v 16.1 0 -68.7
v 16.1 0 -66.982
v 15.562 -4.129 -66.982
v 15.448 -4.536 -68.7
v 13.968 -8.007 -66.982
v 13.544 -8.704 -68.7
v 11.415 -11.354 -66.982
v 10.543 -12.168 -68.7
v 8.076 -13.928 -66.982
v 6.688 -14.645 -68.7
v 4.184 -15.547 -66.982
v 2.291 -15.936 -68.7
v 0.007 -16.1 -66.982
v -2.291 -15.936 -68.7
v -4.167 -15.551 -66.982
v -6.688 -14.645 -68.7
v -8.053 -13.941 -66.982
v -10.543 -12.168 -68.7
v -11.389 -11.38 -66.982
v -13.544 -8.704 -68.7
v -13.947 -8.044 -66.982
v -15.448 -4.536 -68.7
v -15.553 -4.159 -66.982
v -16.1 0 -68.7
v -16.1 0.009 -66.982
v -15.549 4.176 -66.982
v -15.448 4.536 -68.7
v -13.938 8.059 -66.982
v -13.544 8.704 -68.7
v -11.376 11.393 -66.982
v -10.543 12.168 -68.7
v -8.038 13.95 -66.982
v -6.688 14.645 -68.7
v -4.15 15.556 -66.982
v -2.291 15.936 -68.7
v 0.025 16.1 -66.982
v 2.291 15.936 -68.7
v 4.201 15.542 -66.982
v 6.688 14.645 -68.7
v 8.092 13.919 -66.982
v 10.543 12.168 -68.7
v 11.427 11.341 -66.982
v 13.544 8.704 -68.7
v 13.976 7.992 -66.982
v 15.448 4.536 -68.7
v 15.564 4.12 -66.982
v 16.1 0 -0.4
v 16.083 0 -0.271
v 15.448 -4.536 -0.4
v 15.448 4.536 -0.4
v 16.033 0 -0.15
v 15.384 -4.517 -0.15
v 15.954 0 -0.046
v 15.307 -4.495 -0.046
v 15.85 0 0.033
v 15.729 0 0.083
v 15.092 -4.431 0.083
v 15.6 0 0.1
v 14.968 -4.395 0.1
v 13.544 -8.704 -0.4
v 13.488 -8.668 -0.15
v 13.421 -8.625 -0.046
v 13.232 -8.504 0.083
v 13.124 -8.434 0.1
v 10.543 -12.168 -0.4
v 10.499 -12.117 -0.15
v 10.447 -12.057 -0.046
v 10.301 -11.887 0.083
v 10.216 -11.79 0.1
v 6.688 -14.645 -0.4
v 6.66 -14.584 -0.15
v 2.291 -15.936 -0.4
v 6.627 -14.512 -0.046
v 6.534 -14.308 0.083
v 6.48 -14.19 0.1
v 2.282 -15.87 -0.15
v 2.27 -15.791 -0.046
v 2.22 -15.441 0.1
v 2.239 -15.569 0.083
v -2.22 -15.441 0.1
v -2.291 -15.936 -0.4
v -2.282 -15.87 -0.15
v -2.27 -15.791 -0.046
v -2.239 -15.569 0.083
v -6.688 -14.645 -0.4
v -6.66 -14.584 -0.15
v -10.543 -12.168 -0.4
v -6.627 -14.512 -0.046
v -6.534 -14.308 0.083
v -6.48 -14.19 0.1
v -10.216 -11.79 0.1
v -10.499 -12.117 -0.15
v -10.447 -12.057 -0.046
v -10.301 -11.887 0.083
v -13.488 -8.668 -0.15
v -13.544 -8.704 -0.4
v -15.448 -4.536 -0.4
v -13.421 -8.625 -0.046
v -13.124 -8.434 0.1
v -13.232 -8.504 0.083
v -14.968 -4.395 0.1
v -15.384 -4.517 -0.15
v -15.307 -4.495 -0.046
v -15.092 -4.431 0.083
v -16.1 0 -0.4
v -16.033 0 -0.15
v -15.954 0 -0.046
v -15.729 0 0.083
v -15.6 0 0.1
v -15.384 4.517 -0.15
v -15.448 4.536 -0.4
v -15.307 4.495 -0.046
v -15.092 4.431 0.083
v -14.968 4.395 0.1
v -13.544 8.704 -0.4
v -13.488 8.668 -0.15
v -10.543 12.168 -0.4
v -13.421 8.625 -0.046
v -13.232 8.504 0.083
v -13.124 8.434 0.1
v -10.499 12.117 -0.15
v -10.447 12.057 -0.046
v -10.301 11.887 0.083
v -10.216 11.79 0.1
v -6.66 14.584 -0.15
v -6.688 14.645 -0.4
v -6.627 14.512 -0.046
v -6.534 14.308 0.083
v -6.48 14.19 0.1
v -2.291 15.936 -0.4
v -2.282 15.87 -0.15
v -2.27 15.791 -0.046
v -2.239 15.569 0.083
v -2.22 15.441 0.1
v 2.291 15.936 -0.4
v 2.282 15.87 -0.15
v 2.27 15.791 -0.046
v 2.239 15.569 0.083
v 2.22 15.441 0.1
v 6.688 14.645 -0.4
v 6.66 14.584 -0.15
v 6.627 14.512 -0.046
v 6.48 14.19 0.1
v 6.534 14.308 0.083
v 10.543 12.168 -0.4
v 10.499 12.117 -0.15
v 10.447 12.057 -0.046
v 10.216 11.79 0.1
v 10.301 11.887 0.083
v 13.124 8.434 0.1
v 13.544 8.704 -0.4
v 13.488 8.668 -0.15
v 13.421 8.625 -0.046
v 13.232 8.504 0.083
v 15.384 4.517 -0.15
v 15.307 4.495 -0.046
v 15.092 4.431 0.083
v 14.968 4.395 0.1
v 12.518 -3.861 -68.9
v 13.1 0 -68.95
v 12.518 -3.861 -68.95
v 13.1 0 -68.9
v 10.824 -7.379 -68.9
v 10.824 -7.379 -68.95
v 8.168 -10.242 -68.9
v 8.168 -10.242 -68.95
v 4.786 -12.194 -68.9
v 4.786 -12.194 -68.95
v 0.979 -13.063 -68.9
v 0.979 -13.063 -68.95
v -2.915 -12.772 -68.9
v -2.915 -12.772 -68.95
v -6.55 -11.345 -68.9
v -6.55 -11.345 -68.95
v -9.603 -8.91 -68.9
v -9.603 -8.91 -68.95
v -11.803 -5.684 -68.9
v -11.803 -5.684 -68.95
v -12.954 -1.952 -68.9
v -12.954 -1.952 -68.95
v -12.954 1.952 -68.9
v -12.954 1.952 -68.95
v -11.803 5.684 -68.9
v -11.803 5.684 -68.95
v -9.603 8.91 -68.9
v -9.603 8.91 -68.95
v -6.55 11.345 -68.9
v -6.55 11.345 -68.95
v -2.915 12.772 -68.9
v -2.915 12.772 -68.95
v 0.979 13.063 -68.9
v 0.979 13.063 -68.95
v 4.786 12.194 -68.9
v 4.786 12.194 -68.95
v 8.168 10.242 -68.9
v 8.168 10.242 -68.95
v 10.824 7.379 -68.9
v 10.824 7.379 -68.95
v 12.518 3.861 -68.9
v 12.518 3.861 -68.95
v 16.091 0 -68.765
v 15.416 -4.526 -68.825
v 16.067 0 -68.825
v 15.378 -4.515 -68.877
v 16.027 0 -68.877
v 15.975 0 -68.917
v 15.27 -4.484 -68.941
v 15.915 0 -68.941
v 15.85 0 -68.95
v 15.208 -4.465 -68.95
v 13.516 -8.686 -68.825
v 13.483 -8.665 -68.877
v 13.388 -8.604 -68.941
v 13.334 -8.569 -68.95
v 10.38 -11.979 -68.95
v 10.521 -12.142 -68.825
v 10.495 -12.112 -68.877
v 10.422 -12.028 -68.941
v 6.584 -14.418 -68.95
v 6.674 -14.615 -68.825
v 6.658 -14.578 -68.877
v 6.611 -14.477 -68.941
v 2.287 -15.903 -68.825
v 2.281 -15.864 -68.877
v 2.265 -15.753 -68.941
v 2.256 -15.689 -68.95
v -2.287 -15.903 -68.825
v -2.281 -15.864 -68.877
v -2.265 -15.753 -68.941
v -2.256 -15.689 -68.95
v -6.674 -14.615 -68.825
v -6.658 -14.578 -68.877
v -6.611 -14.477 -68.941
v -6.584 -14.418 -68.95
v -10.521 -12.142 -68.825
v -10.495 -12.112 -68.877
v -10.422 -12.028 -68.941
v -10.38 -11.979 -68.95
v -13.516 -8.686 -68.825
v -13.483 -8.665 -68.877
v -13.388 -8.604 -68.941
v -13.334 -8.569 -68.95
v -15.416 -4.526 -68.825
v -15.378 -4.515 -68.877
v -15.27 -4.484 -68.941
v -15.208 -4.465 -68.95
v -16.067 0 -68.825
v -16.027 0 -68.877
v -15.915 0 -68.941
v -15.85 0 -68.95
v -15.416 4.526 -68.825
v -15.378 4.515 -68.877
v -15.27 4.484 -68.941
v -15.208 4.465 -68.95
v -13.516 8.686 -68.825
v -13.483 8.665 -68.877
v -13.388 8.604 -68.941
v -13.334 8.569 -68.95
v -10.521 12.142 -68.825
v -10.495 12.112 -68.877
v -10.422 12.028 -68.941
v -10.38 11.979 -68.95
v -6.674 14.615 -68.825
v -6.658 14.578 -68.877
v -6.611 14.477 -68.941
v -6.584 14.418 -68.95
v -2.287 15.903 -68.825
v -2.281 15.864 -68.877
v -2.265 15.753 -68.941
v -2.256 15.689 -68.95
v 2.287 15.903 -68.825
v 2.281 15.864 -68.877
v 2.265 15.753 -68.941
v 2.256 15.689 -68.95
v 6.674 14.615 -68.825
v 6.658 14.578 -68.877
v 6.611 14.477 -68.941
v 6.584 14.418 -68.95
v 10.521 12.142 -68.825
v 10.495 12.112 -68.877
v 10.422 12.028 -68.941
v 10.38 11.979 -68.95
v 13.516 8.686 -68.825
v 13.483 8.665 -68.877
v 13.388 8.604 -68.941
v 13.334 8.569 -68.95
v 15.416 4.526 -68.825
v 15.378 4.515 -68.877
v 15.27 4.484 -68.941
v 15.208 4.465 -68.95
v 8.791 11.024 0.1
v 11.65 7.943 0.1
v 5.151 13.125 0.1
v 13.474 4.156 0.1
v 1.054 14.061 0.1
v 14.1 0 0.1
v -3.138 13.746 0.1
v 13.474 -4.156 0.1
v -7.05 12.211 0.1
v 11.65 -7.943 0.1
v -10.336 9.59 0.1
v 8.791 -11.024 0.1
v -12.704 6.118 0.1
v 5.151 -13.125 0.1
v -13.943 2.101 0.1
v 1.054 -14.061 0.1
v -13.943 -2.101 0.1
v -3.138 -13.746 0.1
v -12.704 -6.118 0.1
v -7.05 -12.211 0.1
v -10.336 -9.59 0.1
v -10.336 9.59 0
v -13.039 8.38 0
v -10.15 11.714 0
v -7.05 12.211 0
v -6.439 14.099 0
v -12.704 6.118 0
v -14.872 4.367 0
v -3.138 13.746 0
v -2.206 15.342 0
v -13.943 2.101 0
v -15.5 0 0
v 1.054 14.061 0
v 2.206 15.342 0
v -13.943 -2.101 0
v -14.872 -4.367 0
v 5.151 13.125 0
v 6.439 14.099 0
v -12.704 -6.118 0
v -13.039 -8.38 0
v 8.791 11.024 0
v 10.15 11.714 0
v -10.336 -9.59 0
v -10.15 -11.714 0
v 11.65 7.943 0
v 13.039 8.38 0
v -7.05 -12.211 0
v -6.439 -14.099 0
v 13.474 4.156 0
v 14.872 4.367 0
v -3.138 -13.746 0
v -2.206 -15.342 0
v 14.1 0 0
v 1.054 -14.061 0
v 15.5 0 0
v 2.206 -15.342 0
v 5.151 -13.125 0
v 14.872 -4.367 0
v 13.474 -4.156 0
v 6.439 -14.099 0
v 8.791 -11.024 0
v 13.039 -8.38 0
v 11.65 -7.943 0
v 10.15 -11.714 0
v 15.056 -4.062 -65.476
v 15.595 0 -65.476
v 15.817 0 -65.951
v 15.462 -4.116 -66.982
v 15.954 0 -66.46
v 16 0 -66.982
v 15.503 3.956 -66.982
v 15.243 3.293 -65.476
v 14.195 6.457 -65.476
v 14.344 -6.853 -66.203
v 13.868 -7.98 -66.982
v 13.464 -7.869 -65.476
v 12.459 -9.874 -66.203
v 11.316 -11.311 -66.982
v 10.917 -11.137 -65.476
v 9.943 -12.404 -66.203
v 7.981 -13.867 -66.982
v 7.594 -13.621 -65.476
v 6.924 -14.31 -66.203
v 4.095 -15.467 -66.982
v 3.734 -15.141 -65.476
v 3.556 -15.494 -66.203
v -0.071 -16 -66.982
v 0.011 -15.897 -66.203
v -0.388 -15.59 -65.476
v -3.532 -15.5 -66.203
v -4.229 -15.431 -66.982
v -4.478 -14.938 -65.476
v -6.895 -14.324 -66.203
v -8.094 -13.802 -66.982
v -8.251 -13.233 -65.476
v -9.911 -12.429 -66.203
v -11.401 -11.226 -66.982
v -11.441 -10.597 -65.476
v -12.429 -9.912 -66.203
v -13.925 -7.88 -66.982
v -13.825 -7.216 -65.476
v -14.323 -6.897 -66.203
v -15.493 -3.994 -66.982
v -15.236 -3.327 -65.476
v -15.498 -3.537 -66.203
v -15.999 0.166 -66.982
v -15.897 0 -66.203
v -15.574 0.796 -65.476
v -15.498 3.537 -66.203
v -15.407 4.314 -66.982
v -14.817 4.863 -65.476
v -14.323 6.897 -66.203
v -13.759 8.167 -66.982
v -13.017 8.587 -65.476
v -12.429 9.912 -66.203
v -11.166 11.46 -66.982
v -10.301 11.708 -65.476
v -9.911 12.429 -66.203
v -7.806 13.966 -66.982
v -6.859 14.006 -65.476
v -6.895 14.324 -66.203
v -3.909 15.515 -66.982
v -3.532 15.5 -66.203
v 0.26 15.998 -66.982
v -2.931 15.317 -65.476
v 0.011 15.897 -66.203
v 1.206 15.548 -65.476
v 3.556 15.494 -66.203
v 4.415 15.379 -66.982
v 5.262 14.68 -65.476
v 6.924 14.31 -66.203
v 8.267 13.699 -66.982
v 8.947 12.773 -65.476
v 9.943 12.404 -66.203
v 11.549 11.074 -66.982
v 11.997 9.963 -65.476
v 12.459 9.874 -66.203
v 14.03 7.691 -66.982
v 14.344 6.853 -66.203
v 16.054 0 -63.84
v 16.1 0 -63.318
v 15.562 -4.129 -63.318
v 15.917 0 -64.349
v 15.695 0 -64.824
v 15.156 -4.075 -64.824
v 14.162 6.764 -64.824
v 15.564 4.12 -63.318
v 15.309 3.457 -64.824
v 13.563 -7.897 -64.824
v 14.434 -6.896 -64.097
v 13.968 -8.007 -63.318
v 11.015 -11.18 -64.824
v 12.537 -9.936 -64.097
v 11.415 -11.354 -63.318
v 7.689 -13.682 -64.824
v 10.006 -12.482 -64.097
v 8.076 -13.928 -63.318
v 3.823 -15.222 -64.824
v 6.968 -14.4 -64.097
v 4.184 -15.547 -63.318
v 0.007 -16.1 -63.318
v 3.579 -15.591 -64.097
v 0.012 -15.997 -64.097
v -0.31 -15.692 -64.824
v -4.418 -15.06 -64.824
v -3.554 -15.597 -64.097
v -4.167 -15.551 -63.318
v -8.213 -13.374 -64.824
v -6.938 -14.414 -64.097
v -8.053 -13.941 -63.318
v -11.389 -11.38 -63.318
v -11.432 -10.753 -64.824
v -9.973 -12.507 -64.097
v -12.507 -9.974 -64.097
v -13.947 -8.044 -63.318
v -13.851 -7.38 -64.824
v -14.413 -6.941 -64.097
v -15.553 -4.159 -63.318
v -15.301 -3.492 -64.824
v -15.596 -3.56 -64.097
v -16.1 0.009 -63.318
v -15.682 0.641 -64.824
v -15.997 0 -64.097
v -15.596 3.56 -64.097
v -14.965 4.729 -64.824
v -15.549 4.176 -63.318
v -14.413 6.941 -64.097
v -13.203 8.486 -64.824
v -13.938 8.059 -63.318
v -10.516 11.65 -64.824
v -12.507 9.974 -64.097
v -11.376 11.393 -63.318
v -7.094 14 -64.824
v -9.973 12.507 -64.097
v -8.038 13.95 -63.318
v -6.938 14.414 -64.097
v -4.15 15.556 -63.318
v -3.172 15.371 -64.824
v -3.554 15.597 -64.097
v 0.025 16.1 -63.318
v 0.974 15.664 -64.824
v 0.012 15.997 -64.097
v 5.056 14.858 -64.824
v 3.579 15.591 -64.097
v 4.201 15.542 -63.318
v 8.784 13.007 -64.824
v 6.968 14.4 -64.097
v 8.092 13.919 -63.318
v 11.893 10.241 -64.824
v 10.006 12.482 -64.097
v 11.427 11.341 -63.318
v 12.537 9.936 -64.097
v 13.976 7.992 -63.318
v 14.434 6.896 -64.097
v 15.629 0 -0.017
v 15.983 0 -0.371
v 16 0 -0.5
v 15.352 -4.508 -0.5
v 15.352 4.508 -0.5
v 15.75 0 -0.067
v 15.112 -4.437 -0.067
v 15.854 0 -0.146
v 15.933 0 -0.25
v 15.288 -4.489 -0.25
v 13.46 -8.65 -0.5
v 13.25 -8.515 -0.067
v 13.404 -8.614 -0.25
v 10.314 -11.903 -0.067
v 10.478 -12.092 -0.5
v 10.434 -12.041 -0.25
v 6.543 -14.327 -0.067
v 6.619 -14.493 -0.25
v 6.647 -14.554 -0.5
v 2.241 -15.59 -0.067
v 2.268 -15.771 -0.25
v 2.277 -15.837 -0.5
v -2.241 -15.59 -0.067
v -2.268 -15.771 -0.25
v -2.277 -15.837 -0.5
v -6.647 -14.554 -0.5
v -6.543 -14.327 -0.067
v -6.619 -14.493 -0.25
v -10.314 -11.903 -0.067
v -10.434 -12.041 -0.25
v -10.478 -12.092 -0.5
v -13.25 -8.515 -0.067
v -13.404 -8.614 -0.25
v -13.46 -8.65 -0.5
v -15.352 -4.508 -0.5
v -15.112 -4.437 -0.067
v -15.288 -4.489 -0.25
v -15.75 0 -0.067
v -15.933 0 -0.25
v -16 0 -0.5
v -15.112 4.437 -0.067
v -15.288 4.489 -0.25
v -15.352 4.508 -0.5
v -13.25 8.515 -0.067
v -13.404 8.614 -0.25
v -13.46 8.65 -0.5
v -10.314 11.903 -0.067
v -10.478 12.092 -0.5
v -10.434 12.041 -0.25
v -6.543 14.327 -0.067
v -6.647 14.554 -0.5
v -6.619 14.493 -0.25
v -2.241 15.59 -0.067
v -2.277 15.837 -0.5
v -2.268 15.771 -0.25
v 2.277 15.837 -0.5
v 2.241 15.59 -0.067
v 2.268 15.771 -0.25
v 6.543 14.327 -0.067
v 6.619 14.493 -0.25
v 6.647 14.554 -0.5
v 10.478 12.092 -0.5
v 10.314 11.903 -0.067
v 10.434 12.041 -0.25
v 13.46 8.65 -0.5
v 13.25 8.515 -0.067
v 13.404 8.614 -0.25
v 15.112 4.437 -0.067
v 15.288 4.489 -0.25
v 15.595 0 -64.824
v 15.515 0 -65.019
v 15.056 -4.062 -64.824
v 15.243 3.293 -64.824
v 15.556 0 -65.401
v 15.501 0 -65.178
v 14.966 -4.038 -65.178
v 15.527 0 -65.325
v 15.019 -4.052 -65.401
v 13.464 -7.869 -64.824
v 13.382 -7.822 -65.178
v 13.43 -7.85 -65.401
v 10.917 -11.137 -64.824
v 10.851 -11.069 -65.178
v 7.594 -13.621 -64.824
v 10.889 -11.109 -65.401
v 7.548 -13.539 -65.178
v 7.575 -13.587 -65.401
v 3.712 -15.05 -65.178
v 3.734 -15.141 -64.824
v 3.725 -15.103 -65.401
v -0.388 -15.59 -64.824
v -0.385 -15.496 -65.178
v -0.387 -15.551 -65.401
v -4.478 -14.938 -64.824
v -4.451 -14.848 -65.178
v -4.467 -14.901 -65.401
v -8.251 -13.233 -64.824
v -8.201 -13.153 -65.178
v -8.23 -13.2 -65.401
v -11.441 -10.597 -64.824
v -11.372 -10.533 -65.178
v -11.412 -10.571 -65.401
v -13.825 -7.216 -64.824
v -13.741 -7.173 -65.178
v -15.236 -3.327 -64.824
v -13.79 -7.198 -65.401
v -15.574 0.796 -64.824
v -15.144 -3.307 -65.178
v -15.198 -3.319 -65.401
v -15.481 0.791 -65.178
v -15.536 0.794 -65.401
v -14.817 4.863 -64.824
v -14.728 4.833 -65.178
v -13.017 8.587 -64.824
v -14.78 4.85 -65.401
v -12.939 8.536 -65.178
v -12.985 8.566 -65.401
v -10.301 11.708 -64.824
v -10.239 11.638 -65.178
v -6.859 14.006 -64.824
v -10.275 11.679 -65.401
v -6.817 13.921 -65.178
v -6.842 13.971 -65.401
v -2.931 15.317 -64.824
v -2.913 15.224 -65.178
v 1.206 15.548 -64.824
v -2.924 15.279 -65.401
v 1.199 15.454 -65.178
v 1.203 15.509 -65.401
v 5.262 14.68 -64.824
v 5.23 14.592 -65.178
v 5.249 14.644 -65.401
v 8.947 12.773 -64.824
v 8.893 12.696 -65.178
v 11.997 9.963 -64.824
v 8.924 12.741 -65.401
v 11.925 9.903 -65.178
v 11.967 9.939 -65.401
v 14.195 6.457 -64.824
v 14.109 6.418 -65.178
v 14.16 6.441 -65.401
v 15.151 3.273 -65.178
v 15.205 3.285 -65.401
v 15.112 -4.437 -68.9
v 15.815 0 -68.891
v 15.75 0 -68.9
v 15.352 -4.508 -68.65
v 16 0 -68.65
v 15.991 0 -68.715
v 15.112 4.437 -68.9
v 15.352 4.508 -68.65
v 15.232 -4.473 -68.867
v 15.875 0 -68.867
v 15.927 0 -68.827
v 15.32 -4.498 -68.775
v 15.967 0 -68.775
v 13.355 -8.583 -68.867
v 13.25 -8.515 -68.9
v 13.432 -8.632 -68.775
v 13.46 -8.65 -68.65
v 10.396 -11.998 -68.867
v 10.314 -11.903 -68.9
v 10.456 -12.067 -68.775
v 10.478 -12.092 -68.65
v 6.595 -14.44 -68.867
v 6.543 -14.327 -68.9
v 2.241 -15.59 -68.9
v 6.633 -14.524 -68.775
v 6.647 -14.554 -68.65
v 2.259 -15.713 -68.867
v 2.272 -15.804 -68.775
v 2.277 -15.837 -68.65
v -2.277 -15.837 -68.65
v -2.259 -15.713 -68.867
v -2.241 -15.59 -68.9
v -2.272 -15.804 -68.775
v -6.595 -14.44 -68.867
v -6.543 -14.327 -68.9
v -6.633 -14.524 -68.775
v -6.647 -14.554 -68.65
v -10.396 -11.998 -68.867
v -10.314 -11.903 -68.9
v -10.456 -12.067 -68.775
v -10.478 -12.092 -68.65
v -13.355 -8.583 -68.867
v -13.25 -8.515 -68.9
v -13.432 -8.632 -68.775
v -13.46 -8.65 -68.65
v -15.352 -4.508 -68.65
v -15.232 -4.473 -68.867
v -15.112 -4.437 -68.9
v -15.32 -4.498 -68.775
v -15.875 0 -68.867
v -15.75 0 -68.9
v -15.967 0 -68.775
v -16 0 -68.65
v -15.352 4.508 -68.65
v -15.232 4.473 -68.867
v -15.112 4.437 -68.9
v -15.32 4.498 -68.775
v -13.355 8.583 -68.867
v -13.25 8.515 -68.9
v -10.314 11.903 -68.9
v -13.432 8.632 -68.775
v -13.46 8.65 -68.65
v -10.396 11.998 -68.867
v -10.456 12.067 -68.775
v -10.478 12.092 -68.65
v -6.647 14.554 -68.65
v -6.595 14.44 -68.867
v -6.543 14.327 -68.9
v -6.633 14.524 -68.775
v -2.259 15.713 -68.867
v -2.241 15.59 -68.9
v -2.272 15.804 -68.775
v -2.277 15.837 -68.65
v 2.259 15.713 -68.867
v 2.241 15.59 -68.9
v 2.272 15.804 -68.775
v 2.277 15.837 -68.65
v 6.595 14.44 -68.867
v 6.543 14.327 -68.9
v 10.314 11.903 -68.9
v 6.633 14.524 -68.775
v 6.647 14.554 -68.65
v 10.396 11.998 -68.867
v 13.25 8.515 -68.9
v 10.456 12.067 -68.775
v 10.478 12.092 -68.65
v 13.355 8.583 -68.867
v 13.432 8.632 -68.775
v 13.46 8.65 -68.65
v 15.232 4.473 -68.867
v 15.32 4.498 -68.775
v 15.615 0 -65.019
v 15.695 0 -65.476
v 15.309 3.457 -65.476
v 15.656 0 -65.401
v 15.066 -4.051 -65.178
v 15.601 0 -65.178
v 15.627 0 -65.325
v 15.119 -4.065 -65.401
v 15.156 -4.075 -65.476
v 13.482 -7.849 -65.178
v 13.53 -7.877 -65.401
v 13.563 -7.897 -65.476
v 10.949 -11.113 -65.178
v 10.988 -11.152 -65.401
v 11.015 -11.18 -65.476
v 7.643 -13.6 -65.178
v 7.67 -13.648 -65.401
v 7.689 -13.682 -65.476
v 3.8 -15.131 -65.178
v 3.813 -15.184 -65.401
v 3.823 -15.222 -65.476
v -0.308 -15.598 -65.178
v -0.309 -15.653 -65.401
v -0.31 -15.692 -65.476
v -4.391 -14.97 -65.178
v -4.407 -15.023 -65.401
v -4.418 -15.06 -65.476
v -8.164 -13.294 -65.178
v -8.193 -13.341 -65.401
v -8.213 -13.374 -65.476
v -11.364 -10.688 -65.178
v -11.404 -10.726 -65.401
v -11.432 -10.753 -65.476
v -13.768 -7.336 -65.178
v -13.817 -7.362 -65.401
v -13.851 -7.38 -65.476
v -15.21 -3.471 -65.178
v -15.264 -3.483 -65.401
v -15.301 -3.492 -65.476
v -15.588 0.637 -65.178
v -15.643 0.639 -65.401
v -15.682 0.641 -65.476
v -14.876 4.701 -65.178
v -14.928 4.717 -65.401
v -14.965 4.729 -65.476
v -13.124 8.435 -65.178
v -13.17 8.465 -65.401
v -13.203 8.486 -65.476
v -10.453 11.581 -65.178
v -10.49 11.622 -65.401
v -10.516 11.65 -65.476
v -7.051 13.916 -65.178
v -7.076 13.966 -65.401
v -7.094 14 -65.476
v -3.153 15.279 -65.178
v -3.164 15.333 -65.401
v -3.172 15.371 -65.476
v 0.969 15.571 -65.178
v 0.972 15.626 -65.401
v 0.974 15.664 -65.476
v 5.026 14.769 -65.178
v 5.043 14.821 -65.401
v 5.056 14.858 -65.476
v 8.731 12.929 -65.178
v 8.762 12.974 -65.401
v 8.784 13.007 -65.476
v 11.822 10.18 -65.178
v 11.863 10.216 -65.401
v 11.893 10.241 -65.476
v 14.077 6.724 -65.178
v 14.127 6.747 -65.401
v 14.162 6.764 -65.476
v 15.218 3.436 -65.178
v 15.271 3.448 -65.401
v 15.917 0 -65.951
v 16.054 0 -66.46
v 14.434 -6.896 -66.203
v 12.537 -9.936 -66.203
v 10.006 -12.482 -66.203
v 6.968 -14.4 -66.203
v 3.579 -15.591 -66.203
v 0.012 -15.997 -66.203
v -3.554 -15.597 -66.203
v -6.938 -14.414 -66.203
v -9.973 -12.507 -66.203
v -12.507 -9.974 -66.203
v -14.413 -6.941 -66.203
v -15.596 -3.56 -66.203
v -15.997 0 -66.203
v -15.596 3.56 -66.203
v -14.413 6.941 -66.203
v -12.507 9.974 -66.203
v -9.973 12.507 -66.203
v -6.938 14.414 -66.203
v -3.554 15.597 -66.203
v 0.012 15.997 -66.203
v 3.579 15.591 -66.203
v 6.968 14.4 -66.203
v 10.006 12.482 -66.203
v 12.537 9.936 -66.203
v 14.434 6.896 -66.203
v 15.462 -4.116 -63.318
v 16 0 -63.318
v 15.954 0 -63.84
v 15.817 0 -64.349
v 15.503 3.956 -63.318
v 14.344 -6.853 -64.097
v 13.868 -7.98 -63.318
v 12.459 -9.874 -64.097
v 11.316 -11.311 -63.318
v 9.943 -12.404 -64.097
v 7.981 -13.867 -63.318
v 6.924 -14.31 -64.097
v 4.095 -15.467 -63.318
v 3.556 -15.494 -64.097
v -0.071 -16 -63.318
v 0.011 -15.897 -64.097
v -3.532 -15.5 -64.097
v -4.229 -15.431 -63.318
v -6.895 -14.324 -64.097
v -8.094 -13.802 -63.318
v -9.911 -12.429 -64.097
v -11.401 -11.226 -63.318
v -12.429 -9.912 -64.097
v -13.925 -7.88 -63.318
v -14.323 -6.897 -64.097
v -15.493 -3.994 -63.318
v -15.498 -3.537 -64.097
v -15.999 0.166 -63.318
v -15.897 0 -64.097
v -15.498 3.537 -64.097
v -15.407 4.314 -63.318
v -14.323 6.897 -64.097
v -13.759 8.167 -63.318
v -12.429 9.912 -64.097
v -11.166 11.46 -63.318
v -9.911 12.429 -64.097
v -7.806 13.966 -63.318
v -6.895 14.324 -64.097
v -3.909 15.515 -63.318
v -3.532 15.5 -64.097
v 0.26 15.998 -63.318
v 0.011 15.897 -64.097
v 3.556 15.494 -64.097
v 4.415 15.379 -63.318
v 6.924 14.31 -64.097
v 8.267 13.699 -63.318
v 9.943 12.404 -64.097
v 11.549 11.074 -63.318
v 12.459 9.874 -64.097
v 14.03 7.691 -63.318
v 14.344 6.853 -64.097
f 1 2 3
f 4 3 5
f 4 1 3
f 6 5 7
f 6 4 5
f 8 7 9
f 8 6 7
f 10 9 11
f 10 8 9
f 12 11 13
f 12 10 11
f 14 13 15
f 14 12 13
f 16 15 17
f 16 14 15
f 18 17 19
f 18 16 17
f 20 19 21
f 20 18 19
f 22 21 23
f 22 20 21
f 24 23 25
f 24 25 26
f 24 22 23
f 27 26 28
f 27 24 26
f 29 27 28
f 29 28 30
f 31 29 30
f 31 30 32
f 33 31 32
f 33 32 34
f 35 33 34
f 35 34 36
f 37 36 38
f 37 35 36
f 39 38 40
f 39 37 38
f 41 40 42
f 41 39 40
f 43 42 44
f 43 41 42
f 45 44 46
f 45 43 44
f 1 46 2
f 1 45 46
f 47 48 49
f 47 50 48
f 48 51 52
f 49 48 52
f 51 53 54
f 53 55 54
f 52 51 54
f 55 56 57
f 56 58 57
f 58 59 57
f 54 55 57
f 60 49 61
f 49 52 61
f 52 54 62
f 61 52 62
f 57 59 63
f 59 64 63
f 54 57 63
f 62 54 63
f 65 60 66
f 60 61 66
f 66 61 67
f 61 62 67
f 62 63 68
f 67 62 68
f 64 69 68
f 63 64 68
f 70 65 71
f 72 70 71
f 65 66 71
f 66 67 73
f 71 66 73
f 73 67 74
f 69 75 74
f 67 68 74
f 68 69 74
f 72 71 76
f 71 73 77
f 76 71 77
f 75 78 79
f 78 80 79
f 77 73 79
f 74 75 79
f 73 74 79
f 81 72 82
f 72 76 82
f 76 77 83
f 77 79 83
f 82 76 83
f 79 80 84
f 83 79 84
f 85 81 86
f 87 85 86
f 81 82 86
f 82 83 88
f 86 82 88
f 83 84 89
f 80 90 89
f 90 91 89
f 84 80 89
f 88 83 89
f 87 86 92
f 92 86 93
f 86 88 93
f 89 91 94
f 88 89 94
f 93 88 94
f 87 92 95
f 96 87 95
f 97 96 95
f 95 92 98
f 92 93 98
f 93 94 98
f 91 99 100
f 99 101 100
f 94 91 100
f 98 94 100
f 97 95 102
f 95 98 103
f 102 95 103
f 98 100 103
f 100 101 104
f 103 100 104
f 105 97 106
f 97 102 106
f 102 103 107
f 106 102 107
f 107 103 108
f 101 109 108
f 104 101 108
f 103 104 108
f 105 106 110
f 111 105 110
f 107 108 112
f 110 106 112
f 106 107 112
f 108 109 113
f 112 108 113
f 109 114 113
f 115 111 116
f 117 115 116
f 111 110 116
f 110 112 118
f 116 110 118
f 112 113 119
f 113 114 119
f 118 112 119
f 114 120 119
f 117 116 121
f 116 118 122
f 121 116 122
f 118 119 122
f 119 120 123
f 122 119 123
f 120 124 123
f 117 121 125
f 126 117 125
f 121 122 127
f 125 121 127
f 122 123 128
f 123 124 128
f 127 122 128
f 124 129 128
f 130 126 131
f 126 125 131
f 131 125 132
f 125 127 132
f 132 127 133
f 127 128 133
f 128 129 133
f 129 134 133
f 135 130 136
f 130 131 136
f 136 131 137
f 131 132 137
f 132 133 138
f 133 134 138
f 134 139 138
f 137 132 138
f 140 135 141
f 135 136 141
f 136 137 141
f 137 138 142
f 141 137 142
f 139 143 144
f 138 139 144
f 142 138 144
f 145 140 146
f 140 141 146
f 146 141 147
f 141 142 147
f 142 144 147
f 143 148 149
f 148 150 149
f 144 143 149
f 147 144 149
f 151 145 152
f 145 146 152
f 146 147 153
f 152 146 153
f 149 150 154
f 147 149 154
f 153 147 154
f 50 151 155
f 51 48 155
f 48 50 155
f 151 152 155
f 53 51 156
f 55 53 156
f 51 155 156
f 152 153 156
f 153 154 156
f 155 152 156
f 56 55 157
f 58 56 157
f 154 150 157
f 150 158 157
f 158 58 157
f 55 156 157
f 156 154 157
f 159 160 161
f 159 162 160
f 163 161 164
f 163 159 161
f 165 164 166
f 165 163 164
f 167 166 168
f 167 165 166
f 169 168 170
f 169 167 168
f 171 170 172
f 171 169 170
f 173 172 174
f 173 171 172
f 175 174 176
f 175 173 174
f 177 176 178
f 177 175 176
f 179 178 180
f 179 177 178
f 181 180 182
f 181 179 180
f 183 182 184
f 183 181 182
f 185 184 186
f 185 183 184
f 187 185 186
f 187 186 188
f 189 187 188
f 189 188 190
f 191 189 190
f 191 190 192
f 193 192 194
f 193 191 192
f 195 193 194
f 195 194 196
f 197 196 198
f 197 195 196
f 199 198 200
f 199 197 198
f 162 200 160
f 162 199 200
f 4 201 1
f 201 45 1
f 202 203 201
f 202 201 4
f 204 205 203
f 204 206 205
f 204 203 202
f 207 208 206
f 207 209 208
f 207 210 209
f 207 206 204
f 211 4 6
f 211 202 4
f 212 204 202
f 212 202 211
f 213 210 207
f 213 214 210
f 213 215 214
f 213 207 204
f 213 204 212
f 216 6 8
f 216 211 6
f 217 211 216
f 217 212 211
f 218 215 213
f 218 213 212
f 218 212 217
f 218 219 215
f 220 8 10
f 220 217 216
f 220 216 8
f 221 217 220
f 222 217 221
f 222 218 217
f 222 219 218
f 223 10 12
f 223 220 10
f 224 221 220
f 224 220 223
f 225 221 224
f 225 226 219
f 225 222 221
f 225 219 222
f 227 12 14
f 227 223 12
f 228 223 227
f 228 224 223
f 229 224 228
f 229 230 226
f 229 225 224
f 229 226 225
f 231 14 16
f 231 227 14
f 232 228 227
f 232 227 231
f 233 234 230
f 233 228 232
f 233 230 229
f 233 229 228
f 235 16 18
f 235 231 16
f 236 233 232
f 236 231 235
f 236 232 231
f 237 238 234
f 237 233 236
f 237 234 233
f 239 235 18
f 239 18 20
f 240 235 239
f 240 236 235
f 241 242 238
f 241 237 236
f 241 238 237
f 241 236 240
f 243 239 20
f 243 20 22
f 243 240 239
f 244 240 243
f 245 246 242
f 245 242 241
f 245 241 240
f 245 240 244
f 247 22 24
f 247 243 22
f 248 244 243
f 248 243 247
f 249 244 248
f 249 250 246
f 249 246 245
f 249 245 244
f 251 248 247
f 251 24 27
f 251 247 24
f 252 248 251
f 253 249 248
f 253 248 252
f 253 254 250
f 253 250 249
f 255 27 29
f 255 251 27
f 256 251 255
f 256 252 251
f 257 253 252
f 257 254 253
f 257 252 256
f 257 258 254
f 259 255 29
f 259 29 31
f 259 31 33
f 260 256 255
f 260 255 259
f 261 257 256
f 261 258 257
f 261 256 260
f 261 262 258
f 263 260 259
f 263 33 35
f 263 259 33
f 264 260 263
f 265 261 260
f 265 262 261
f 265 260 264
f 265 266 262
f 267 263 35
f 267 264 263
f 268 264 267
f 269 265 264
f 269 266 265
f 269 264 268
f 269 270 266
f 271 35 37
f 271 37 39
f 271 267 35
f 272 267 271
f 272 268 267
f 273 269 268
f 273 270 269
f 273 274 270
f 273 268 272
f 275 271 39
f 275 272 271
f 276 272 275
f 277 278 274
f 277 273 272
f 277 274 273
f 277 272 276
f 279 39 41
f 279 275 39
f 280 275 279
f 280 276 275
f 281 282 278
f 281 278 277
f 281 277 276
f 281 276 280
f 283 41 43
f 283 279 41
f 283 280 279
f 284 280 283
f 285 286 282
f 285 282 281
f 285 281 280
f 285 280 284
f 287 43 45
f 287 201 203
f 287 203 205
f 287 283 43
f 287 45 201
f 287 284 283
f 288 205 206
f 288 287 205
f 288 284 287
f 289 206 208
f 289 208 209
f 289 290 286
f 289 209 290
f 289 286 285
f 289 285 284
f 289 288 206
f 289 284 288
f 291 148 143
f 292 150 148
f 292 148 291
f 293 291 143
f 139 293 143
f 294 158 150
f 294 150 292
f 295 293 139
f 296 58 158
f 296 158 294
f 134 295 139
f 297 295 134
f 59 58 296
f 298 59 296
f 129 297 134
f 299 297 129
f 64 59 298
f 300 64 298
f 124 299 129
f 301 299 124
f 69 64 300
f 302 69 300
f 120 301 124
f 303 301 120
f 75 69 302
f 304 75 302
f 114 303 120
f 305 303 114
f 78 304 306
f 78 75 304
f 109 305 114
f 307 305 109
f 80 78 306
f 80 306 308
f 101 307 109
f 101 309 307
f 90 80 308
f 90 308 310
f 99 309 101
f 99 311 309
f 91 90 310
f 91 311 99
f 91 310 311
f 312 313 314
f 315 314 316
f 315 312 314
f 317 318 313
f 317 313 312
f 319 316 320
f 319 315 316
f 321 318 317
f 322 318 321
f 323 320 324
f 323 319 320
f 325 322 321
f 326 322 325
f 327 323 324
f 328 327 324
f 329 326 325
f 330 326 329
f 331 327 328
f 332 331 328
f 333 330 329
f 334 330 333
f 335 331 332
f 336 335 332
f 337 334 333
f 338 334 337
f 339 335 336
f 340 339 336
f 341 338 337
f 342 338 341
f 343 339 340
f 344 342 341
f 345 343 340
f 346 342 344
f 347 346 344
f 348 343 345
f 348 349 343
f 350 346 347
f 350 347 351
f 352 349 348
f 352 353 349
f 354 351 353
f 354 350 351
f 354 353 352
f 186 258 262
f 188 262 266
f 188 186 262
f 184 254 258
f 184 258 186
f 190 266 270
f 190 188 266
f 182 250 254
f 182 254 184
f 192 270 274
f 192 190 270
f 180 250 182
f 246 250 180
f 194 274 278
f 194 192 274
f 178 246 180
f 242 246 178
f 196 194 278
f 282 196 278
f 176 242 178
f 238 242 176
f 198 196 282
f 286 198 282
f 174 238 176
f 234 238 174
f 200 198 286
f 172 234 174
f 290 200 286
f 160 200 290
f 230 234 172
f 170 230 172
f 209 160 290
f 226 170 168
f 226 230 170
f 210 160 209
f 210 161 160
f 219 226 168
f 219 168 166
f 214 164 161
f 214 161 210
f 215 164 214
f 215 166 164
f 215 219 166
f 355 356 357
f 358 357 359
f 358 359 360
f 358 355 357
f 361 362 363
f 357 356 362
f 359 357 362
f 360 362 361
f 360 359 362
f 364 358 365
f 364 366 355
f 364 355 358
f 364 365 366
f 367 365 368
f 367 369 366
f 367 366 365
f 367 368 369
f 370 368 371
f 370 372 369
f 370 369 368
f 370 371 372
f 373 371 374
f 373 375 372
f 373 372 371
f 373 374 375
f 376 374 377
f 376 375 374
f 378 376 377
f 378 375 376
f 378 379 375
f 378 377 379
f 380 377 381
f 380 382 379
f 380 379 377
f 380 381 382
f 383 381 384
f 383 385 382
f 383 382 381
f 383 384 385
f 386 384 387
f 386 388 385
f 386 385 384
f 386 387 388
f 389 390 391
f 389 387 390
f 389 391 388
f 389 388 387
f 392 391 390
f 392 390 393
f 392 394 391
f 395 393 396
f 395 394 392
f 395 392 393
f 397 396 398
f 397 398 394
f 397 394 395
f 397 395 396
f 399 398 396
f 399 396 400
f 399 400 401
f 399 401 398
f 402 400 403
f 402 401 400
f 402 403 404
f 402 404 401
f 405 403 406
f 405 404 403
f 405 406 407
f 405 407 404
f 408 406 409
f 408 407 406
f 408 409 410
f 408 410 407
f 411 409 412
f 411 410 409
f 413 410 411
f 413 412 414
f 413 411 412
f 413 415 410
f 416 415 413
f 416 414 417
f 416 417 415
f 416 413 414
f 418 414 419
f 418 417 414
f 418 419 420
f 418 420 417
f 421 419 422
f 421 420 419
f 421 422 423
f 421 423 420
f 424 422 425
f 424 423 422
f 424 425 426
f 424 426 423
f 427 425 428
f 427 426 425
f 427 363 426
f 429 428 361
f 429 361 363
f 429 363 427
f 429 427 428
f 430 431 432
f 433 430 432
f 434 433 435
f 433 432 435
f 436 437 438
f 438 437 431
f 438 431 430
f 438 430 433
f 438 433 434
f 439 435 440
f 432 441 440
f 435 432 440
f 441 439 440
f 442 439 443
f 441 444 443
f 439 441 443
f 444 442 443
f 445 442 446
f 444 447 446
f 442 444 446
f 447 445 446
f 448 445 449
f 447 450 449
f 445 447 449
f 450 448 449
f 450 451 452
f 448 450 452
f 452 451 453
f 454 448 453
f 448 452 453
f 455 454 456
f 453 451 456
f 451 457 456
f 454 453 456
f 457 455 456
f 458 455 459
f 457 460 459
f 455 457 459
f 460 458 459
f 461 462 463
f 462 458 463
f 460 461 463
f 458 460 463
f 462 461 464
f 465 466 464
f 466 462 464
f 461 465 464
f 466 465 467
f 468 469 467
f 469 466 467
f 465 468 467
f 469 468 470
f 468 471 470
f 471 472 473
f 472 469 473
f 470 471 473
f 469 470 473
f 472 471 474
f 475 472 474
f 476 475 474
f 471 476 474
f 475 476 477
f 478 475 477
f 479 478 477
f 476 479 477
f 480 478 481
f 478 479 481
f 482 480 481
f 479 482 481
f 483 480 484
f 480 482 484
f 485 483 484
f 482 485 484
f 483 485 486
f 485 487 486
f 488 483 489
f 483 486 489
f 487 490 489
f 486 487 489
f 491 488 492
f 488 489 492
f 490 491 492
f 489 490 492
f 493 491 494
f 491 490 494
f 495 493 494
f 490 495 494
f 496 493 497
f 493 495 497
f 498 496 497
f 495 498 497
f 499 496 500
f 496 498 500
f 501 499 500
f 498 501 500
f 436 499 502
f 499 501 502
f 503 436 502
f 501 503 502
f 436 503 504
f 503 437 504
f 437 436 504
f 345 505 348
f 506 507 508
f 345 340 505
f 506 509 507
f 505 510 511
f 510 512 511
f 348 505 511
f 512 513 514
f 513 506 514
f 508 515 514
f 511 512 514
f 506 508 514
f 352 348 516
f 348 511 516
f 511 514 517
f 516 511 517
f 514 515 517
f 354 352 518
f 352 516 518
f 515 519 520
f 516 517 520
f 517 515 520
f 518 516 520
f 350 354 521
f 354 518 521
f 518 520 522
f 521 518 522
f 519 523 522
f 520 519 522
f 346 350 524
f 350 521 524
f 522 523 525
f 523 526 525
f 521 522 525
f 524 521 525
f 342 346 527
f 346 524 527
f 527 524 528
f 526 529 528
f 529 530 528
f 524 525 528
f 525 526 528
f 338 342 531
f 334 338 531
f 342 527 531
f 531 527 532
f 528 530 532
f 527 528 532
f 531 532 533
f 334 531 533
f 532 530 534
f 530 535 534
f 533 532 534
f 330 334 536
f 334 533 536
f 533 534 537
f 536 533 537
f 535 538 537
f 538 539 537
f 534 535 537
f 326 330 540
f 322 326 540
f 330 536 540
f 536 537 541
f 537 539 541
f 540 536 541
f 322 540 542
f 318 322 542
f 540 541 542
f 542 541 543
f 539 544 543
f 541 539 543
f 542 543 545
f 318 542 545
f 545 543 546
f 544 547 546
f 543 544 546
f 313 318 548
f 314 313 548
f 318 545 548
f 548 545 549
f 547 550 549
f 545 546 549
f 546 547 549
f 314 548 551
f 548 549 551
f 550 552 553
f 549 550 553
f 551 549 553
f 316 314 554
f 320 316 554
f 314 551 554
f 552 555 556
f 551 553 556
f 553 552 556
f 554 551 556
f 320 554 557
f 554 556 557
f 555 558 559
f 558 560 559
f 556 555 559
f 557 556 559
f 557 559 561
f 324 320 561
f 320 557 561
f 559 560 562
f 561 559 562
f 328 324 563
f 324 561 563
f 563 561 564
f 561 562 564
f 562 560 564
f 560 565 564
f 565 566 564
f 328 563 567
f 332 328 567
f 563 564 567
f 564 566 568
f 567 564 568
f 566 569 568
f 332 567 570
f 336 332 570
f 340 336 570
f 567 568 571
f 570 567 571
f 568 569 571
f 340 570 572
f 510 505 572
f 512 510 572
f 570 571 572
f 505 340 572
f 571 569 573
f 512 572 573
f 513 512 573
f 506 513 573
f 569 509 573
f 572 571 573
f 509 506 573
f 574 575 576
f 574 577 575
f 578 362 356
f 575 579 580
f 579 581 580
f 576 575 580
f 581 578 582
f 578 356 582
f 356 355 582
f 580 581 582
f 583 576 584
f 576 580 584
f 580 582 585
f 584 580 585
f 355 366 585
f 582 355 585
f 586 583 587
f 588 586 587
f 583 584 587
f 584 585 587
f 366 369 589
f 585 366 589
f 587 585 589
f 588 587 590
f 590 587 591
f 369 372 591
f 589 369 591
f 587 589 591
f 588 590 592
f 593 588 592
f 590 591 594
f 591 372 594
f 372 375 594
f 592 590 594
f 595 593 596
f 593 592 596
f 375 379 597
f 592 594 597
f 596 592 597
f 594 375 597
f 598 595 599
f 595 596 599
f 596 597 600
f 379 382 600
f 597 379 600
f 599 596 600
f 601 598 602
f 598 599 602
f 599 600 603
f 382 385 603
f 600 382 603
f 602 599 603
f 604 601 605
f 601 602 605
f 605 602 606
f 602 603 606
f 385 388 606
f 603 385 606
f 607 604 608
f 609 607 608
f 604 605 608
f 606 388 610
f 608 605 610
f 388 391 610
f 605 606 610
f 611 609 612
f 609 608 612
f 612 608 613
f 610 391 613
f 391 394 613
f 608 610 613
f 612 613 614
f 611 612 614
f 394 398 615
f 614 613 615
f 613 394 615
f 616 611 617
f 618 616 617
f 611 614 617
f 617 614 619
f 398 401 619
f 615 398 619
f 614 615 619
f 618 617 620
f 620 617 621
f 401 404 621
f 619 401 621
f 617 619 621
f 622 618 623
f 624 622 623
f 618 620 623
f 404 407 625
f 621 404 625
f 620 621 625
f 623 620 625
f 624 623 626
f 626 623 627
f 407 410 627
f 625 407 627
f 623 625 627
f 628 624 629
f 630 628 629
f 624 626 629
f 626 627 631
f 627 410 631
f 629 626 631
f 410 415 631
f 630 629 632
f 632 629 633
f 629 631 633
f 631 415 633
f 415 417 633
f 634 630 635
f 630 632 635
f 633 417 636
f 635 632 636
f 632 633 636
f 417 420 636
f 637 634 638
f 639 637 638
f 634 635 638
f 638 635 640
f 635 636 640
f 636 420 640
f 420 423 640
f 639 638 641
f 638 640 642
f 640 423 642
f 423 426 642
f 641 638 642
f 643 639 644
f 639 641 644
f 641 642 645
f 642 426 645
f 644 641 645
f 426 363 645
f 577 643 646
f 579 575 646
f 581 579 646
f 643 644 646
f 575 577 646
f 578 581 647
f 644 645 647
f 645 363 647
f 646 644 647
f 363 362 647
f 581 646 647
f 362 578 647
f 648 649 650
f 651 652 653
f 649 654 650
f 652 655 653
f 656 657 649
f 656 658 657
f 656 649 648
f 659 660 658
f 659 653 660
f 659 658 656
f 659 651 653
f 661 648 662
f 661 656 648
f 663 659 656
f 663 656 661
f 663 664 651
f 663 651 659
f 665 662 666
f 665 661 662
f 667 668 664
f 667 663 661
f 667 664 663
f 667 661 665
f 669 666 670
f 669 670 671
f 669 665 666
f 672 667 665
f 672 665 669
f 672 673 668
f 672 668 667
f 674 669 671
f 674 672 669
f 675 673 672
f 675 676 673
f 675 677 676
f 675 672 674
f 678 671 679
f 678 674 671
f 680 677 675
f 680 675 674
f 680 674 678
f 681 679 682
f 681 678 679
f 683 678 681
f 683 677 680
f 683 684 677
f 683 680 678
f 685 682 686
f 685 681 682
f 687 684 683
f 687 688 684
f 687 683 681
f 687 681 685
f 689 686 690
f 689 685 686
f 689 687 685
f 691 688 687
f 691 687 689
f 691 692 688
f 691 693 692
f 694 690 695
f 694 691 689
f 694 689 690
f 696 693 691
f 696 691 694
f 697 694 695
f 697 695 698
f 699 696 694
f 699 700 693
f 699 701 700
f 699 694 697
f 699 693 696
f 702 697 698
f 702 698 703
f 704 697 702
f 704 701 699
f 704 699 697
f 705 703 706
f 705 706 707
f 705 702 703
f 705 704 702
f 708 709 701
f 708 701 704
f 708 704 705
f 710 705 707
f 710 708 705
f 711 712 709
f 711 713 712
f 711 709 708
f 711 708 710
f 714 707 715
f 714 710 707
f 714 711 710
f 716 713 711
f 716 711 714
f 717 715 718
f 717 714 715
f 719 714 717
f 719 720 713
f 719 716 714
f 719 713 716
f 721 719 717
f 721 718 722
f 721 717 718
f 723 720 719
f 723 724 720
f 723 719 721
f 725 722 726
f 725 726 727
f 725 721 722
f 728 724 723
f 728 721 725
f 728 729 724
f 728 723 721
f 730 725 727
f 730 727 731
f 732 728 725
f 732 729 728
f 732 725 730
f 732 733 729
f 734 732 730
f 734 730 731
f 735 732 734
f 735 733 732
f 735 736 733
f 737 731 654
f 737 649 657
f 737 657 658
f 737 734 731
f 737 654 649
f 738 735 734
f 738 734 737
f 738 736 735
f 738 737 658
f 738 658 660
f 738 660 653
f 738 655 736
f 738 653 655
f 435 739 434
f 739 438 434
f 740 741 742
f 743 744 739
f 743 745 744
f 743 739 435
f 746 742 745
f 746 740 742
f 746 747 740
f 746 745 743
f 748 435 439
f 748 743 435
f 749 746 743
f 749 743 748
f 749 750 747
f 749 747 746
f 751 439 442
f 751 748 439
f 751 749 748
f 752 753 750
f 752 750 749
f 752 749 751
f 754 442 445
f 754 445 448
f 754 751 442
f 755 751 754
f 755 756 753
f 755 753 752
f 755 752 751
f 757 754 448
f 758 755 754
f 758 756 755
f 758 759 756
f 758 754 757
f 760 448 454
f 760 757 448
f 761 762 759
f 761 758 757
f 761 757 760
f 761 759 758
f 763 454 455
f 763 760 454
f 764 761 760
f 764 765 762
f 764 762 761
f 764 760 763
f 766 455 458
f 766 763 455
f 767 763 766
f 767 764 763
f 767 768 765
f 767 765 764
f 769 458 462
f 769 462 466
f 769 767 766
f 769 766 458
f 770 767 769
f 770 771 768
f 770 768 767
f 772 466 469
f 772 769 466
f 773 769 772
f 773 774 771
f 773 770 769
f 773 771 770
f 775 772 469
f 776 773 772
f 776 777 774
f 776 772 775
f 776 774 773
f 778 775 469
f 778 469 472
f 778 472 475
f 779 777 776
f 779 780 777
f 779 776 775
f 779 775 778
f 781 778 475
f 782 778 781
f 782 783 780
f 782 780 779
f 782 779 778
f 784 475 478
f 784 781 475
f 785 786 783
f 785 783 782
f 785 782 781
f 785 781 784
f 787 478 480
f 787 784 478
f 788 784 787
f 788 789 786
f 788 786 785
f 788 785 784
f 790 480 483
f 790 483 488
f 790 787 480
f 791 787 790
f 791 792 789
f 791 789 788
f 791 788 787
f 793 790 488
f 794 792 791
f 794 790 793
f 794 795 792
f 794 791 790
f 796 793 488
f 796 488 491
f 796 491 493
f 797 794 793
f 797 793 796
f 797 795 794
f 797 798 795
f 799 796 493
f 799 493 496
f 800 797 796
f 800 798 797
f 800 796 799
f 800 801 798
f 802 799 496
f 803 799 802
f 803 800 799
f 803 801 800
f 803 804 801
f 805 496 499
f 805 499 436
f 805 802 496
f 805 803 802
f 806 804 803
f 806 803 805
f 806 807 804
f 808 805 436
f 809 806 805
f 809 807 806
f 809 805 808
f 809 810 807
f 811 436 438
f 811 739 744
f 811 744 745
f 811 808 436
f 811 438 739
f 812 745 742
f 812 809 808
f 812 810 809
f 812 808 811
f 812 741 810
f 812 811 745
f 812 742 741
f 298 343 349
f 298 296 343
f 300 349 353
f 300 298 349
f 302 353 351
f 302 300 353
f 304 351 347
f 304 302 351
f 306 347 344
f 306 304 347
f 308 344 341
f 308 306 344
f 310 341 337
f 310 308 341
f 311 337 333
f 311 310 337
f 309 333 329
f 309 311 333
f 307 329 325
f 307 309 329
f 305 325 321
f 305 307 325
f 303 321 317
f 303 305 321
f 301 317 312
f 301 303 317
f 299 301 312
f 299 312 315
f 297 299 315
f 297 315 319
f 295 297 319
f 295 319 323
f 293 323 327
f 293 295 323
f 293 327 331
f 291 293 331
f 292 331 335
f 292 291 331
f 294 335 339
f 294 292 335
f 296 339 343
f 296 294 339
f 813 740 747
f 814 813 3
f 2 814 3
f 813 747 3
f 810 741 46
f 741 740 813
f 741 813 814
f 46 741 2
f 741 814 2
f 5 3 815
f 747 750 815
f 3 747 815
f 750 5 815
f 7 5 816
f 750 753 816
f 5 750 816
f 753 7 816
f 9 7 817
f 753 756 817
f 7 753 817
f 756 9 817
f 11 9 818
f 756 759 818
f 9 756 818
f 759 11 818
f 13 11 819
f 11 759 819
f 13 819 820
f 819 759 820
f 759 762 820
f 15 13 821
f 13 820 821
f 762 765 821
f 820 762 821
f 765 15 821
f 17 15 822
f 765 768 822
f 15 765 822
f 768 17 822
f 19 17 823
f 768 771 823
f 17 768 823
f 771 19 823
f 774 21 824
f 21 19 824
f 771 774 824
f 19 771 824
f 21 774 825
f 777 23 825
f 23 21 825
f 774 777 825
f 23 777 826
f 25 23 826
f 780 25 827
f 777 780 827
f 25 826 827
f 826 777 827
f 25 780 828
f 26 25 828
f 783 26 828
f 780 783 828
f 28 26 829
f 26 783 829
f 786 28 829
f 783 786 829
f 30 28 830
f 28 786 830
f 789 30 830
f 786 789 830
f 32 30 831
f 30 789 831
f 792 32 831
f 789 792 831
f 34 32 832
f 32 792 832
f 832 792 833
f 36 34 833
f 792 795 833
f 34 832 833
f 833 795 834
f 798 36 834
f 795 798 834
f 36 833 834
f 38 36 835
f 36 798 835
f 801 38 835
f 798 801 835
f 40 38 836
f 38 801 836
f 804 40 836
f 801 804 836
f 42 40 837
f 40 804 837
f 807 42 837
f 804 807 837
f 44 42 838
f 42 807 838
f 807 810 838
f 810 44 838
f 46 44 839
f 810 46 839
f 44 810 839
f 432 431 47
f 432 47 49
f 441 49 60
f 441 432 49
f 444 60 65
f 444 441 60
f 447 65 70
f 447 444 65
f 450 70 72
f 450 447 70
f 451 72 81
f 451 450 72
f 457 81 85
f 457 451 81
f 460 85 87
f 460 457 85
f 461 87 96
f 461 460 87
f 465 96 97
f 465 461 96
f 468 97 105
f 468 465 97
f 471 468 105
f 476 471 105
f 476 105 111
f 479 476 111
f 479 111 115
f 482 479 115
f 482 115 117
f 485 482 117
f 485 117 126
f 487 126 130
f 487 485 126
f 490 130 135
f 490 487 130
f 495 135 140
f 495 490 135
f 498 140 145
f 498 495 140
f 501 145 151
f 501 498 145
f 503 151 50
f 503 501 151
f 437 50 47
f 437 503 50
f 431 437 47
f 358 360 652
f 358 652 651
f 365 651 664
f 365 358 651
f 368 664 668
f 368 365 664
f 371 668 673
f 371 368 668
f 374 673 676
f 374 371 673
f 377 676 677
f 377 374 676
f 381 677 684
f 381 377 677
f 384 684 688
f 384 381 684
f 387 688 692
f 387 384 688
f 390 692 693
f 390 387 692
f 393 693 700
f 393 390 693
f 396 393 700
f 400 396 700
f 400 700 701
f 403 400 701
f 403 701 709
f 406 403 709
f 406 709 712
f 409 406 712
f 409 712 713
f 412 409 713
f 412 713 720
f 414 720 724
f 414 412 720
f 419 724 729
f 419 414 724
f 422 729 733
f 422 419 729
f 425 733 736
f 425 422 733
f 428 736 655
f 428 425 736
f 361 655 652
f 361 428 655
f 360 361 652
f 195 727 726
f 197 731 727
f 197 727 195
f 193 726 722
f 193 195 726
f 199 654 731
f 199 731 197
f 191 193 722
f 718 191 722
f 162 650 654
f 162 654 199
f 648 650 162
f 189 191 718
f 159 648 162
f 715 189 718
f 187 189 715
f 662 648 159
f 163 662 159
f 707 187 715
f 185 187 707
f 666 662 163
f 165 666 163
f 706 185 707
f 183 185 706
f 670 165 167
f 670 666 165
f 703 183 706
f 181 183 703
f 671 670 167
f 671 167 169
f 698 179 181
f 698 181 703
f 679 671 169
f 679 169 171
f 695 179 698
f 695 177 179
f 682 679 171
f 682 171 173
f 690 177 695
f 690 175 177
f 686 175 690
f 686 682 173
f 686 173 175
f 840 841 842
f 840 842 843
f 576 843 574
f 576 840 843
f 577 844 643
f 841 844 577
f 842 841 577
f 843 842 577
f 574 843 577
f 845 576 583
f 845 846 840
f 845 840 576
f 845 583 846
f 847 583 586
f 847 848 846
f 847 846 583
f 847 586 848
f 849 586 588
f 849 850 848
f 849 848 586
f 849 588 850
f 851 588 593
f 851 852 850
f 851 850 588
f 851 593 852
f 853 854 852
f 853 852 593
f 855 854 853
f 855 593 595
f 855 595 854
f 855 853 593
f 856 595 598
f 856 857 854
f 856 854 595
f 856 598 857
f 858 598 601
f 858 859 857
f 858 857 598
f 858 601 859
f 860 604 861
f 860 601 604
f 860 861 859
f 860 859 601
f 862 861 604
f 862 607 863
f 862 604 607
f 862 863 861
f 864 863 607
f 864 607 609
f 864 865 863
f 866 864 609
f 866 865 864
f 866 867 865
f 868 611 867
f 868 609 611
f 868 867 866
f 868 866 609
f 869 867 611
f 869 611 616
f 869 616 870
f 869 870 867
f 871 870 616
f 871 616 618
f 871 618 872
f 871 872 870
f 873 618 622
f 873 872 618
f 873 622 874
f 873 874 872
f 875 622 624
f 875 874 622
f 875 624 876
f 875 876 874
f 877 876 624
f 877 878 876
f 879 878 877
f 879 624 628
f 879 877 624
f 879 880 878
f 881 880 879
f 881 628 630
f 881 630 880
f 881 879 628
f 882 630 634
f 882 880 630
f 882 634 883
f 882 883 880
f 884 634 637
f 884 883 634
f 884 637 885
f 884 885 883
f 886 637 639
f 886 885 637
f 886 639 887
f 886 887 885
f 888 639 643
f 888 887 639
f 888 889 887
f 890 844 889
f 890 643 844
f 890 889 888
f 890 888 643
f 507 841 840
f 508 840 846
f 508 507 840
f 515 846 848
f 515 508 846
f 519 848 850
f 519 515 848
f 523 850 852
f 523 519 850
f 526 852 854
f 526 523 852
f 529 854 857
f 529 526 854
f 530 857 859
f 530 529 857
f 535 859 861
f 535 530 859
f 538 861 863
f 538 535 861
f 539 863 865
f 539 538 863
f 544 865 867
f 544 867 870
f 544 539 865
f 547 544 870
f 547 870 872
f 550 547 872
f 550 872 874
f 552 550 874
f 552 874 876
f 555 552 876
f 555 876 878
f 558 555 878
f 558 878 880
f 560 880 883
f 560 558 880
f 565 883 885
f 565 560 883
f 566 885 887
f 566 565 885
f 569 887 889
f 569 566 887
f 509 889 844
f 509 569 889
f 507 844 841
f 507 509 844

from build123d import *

# Parameters (mm, degrees)
FILLET1_R = 0.25
FILLET2_R = 0.5
FILLET3_R = 3


with BuildPart() as part:
    # Sketch1 → Revolve1 (revolve)
    with BuildSketch(Plane(origin=(0, 0, 0), x_dir=(0, 0, -1), z_dir=(1, 0, 0)), mode=Mode.PRIVATE) as revolve1_sk:
        with BuildLine():
            Line((0, 14.1), (-0.1, 14.1))
            Line((-0.1, 14.1), (-0.1, 16.1))
            Line((-0.1, 16.1), (64.4, 16.1))
            add(Edge.make_bspline(
                [(64.4, 16.1), (65.15, 15.1), (65.9, 16.1)],
                knots=[0, 0, 0, 1, 1, 1], degree=2))
            Line((65.9, 16.1), (68.95, 16.1))
            Line((68.95, 16.1), (68.95, 13.1))
            Line((68.95, 13.1), (68.9, 13.1))
            Line((68.9, 13.1), (68.9, 16))
            Line((68.9, 16), (65.9, 16))
            add(Edge.make_bspline(
                [(64.4, 16), (65.15, 15), (65.9, 16)],
                knots=[0, 0, 0, 1, 1, 1], degree=2))
            Line((64.4, 16), (0, 16))
            Line((0, 16), (0, 14.1))
        make_face()
    revolve(revolve1_sk.sketch.rotate(Axis((0, 0, 0), (0, 0, -1)), 90), axis=Axis((0, 0, 0), (0, 0, -1)))

    # Fillet1
    fillet1_edges = [part.edges().sort_by_distance(p)[0] for p in [
        (-16.1, 0, -68.95),
        (-16, 0, -68.9),
    ]]
    fillet(fillet1_edges, radius=FILLET1_R)

    # Fillet2
    fillet2_edges = [part.edges().sort_by_distance(p)[0] for p in [
        (-16.1, 0, 0.1),
        (-16, 0, 0),
    ]]
    fillet(fillet2_edges, radius=FILLET2_R)

    # Fillet3
    fillet3_edges = [part.edges().sort_by_distance(p)[0] for p in [
        (-16.1, 0, -65.9),
        (-16.1, 0, -64.4),
        (-16, 0, -64.4),
        (-16, 0, -65.9),
    ]]
    fillet(fillet3_edges, radius=FILLET3_R)


solid = part.part
